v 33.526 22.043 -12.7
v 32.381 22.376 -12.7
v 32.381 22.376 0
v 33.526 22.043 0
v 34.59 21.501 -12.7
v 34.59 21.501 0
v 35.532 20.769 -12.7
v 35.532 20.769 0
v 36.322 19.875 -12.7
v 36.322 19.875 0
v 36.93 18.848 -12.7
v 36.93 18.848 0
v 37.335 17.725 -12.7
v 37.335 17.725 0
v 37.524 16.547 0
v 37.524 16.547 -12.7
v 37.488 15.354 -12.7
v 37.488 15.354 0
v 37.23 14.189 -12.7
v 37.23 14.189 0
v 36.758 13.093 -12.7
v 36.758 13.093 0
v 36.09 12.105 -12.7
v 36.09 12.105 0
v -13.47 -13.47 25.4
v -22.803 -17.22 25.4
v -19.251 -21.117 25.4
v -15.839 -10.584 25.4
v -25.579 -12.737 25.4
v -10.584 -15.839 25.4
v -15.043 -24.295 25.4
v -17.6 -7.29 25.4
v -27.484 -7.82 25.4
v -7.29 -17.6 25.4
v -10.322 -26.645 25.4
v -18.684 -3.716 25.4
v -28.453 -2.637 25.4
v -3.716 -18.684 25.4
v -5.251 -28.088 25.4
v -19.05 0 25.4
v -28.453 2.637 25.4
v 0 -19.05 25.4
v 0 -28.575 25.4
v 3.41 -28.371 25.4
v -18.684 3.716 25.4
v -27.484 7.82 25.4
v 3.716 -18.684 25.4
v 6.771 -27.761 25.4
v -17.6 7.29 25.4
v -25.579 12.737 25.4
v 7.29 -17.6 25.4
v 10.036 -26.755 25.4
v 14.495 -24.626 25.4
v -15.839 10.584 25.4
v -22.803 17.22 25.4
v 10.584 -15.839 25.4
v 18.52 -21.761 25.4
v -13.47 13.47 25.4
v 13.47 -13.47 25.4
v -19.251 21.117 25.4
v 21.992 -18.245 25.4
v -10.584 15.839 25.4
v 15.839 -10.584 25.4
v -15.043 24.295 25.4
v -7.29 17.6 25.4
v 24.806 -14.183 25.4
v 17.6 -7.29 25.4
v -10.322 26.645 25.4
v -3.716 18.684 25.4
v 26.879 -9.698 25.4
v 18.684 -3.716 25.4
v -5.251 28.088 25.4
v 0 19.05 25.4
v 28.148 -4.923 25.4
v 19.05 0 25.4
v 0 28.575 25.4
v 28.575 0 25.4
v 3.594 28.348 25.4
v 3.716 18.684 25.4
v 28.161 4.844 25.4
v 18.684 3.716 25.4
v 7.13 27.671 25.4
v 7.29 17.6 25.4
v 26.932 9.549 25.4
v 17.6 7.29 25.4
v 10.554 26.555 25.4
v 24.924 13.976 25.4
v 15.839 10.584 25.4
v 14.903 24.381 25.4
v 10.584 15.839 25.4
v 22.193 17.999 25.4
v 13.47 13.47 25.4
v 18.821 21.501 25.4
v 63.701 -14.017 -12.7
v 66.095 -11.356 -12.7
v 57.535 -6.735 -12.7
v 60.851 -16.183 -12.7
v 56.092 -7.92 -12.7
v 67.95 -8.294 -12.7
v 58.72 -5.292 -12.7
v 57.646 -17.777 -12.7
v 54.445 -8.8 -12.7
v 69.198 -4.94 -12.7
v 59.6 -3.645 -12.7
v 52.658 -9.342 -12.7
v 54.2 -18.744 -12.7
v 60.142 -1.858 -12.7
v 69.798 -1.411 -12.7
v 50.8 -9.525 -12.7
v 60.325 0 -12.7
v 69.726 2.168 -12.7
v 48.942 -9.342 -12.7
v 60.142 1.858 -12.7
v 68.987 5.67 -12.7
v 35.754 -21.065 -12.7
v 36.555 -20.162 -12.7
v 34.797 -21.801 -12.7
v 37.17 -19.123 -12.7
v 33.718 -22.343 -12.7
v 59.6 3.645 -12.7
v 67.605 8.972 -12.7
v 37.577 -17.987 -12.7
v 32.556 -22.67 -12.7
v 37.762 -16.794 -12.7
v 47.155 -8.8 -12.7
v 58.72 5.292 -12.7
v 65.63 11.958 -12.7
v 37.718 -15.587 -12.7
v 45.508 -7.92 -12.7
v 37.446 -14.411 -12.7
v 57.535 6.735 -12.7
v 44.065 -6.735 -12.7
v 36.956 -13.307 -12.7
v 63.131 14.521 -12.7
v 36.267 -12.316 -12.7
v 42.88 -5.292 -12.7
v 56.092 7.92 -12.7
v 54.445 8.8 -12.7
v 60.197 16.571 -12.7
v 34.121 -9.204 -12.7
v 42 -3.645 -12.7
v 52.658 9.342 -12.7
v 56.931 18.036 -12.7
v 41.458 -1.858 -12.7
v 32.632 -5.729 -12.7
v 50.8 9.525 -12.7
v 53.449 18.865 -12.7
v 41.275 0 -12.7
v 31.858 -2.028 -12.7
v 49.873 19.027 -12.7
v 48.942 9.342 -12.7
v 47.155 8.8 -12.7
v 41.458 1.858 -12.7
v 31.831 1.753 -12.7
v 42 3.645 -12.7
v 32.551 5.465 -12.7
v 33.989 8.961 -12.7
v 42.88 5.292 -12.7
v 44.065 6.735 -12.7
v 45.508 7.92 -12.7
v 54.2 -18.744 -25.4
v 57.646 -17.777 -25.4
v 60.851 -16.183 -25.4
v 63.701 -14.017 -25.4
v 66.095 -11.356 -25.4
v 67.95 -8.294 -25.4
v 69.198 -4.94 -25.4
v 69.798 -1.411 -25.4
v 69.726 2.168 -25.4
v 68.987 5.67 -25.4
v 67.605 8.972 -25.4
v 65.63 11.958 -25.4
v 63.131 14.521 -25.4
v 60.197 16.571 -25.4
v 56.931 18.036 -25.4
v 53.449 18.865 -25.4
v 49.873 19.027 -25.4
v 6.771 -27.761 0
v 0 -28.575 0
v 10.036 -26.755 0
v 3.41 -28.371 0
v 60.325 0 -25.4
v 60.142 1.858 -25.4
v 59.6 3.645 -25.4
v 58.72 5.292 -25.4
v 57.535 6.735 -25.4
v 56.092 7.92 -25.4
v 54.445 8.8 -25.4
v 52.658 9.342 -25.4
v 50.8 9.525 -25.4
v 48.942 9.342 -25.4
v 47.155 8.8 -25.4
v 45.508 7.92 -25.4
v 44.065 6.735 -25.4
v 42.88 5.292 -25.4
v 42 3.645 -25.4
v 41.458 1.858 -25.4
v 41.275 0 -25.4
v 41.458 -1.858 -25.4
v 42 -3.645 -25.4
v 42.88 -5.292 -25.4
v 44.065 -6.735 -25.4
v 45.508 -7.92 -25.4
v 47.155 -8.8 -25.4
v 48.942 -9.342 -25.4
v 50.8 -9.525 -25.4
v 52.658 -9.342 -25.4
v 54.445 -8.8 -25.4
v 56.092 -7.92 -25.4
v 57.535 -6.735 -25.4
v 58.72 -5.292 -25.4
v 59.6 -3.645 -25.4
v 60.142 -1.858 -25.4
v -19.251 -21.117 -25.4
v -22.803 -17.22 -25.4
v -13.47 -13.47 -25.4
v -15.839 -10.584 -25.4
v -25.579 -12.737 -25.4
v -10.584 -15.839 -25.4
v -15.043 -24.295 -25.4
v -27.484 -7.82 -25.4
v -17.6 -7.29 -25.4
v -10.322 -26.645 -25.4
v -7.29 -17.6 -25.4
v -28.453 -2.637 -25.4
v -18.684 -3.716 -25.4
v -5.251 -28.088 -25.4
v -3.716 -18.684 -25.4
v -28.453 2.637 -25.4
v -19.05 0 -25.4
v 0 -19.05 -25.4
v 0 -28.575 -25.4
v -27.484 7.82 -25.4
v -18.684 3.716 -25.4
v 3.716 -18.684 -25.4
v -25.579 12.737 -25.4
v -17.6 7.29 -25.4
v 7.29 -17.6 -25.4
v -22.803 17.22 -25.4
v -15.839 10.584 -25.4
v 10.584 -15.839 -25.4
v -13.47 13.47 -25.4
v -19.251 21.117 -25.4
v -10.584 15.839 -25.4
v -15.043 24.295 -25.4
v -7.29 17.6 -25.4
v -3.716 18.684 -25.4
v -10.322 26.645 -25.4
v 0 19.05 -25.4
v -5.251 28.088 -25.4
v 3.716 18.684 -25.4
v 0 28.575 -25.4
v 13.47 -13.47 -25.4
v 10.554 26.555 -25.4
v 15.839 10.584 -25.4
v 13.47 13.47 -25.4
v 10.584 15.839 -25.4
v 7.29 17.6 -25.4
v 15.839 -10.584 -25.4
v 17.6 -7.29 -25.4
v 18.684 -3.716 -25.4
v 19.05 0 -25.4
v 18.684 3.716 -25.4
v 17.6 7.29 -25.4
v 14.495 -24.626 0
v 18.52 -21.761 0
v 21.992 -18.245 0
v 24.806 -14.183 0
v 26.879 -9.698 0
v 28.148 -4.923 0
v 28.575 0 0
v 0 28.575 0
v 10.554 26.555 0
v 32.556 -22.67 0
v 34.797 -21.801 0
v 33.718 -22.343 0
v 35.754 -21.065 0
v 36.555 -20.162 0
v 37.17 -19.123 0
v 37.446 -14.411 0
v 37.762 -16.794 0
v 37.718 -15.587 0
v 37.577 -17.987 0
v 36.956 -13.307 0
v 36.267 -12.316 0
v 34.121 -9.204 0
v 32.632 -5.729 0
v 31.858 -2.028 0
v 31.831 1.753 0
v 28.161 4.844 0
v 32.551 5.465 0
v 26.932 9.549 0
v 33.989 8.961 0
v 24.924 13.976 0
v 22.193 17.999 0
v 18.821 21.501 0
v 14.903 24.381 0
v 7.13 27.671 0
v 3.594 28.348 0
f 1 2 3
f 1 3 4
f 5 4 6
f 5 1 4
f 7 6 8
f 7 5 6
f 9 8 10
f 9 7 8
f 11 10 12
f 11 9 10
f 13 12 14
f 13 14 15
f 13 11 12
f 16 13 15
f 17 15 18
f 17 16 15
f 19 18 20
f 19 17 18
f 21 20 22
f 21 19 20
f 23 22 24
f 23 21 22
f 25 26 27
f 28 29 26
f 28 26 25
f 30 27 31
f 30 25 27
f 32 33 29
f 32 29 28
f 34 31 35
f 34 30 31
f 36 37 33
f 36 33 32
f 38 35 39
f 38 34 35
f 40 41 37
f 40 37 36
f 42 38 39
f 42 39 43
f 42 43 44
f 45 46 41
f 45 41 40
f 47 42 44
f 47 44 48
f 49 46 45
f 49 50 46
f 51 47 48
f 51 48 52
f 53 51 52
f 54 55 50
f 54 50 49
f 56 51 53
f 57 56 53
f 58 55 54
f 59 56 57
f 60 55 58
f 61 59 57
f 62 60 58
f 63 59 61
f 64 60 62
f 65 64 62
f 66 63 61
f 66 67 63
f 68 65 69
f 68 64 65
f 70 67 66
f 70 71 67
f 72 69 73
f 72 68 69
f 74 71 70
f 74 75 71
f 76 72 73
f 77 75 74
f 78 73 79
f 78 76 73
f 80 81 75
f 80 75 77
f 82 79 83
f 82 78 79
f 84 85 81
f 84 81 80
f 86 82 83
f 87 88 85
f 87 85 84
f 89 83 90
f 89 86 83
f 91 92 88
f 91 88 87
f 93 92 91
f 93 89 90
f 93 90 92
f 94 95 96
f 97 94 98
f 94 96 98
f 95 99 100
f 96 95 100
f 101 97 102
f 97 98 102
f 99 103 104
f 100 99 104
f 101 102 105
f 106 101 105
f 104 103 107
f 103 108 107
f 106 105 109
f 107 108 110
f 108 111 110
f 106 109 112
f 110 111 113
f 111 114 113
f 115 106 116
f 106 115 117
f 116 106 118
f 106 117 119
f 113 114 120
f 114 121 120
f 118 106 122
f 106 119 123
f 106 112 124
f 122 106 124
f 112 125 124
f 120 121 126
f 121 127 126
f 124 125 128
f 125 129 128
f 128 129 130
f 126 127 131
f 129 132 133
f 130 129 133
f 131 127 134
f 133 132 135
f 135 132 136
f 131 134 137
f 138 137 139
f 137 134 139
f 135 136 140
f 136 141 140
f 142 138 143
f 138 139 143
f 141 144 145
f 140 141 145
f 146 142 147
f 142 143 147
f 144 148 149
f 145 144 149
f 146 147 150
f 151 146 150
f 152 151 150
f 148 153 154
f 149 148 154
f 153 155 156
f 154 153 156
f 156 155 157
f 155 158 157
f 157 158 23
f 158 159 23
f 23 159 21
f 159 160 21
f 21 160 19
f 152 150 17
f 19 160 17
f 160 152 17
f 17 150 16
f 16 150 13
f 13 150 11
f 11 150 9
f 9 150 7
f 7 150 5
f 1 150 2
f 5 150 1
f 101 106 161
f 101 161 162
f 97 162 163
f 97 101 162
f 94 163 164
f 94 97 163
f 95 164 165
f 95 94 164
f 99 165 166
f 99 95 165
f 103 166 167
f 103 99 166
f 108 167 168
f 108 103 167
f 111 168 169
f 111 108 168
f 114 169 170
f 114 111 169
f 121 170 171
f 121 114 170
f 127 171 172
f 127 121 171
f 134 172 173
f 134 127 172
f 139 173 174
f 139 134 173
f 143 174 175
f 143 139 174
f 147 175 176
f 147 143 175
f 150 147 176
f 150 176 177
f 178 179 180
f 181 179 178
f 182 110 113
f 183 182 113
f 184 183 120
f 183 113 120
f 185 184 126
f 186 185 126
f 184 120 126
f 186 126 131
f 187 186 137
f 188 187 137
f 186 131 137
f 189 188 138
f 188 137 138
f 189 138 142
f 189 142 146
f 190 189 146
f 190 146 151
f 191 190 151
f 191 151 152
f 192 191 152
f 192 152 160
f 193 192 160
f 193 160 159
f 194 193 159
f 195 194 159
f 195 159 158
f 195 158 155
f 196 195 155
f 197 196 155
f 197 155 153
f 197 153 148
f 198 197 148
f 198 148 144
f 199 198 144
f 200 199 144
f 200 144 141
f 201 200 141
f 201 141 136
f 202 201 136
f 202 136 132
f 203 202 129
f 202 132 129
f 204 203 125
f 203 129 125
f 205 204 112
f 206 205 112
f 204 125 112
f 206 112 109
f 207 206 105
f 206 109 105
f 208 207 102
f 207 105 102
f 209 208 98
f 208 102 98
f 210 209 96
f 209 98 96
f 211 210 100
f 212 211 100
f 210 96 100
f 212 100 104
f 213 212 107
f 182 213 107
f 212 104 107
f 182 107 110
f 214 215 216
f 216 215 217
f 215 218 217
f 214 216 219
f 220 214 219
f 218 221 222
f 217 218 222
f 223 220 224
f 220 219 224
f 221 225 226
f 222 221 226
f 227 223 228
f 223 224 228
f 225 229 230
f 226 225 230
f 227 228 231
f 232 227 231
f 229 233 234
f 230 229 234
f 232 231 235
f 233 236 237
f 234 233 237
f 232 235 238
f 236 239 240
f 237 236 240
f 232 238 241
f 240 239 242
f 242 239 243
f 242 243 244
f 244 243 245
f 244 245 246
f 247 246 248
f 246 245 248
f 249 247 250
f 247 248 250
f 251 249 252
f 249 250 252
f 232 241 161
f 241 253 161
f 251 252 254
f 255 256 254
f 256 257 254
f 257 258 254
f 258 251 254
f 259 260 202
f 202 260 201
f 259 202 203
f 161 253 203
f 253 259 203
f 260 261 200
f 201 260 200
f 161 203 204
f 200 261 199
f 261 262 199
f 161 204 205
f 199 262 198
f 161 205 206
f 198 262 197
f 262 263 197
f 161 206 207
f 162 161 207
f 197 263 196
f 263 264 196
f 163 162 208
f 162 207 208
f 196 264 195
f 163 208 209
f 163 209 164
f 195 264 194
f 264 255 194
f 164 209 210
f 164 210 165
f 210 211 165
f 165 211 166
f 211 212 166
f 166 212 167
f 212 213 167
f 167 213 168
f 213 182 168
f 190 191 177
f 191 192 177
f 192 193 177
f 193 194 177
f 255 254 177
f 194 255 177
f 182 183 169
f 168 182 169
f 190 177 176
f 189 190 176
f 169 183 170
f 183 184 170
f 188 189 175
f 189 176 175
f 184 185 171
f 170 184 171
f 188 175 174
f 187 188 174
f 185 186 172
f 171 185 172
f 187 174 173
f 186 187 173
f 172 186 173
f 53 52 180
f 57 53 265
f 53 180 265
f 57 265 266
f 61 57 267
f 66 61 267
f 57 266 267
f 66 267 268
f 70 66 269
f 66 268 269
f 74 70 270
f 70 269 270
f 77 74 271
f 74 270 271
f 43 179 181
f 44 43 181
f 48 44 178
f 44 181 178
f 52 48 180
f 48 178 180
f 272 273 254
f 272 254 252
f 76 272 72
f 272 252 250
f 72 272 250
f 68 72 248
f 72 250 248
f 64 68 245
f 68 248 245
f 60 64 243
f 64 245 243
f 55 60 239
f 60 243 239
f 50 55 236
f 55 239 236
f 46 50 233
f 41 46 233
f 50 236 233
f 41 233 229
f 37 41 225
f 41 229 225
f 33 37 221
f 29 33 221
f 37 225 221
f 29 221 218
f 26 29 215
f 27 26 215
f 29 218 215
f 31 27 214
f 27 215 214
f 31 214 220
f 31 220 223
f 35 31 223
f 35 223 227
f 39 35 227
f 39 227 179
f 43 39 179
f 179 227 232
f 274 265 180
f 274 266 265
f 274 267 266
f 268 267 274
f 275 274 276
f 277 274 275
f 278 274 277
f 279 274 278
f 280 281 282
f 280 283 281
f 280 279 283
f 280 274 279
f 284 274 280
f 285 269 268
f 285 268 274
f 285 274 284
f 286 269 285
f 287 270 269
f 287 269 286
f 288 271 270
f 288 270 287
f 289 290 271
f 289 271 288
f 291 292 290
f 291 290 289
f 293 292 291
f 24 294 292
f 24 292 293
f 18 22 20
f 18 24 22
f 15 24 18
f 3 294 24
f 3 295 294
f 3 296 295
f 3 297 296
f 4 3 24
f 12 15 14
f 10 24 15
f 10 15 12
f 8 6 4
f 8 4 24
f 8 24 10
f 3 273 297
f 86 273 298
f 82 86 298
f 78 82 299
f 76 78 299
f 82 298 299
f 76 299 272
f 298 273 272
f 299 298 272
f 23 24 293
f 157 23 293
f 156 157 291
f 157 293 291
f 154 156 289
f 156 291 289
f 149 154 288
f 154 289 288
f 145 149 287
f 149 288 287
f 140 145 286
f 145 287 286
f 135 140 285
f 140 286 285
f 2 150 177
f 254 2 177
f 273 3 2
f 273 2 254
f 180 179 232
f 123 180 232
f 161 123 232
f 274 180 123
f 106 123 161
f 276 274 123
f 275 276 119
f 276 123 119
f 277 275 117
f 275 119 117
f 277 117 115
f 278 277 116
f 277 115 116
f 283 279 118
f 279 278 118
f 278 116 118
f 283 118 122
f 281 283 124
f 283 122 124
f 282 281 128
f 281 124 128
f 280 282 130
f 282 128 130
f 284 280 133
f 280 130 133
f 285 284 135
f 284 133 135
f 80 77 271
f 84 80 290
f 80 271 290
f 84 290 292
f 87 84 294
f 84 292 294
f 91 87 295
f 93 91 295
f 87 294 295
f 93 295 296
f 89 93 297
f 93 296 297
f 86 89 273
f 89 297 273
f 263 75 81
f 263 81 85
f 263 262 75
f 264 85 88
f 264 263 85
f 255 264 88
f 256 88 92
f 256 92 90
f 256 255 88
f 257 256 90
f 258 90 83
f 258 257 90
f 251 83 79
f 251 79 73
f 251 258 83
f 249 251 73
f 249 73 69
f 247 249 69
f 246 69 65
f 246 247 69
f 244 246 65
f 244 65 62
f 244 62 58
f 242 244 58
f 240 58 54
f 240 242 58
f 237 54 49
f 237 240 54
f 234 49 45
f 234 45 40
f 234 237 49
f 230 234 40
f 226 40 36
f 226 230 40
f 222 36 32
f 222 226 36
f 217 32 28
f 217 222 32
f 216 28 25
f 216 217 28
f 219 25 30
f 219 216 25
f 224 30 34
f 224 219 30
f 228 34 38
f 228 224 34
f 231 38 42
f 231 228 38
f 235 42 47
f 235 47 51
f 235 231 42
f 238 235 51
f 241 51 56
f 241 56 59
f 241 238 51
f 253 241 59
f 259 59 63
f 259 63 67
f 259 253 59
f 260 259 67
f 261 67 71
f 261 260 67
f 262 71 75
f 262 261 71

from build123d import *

# Parameters (mm, degrees)
F0_R        = 19.05
F0_R_2      = 9.525
F1_DEPTH    = 25.4
F2_DEPTH    = 25.4
F3_DEPTH    = 12.7
F4_T1_DEPTH = 57.2245179891
F4_T3_DEPTH = 67.6926131403


# Not quite as in the source:
# - a fillet or chamfer that OpenCascade refuses, or shapes differently, is made with other operations: its cross-section is extruded or revolved along the edge and cut away or added


with BuildPart() as f1:
    # F0 (on Top) → F1 (new body)
    with BuildSketch(Plane.XY):
        with BuildLine():
            Line((10.5539222721, 26.5545730464), (0, 28.575))
            ThreePointArc((0, 28.575), (-28.575, 0), (0, -28.575))
            Line((0, -28.575), (10.035773719, -26.7546981082))
            ThreePointArc((10.035773719, -26.7546981082), (23.4872610048, -16.2751096921), (28.575, 0))
            ThreePointArc((28.575, 0), (23.644332872, 16.046063319), (10.5539222721, 26.5545730464))
        make_face()
        Circle(F0_R, mode=Mode.SUBTRACT)
        with BuildLine():
            Line((49.8728171001, 19.0274231537), (10.5539222721, 26.5545730464))
            ThreePointArc((10.5539222721, 26.5545730464), (23.644332872, 16.046063319), (28.575, 0))
            ThreePointArc((28.575, 0), (23.4872610048, -16.2751096921), (10.035773719, -26.7546981082))
            Line((10.035773719, -26.7546981082), (54.1998407335, -18.7441613039))
            ThreePointArc((54.1998407335, -18.7441613039), (31.8737838621, -2.1681426844), (49.8728171001, 19.0274231537))
        make_face()
        with BuildLine():
            ThreePointArc((69.85, 0), (63.9384867043, 13.7942983555), (49.8728171001, 19.0274231537))
            ThreePointArc((49.8728171001, 19.0274231537), (31.8737838621, -2.1681426844), (54.1998407335, -18.7441613039))
            ThreePointArc((54.1998407335, -18.7441613039), (65.4230890371, -12.2093311452), (69.85, 0))
        make_face()
        with Locations((50.8, 0)):
            Circle(F0_R_2, mode=Mode.SUBTRACT)
    extrude(amount=-F1_DEPTH)

    # F0 (on Top) → F2 (join)
    with BuildSketch(Plane.XY):
        with BuildLine():
            Line((10.5539222721, 26.5545730464), (0, 28.575))
            ThreePointArc((0, 28.575), (-28.575, 0), (0, -28.575))
            Line((0, -28.575), (10.035773719, -26.7546981082))
            ThreePointArc((10.035773719, -26.7546981082), (23.4872610048, -16.2751096921), (28.575, 0))
            ThreePointArc((28.575, 0), (23.644332872, 16.046063319), (10.5539222721, 26.5545730464))
        make_face()
        Circle(F0_R, mode=Mode.SUBTRACT)
        with BuildLine():
            Line((10.035773719, -26.7546981082), (0, -28.575))
            ThreePointArc((0, -28.575), (5.0997611002, -28.1162419559), (10.035773719, -26.7546981082))
        make_face()
        with BuildLine():
            ThreePointArc((10.5539222721, 26.5545730464), (5.3727879262, 28.0653482947), (0, 28.575))
            Line((0, 28.575), (10.5539222721, 26.5545730464))
        make_face()
    extrude(amount=F2_DEPTH)

    # F0 (on Top) → F3 (cut)
    with BuildSketch(Plane.XY):
        with BuildLine():
            ThreePointArc((69.85, 0), (63.9384867043, 13.7942983555), (49.8728171001, 19.0274231537))
            ThreePointArc((49.8728171001, 19.0274231537), (31.8737838621, -2.1681426844), (54.1998407335, -18.7441613039))
            ThreePointArc((54.1998407335, -18.7441613039), (65.4230890371, -12.2093311452), (69.85, 0))
        make_face()
        with Locations((50.8, 0)):
            Circle(F0_R_2, mode=Mode.SUBTRACT)
    extrude(amount=-F3_DEPTH, mode=Mode.SUBTRACT)

    # F4: fillet of radius 6.35 on 3 edges, made by hand

    # F4_s2 → F4_t1 (cut)
    with BuildSketch(Plane.XY.offset(-12.7)):
        with BuildLine():
            ThreePointArc((32.3806581498, 22.376095667), (37.1591875386, 18.2961908719), (36.0900289579, 12.1045137012))
            ThreePointArc((36.0900289579, 12.1045137012), (42.2494552996, 17.0232395662), (49.8728171001, 19.0274231537))
            Line((49.8728171001, 19.0274231537), (32.3806581498, 22.376095667))
        make_face()
    extrude(amount=F4_T1_DEPTH, mode=Mode.SUBTRACT)

    # F4_s4 → F4_t3 (cut)
    with BuildSketch(Plane.XY.offset(-12.7)):
        with BuildLine():
            ThreePointArc((32.5559475844, -22.6699592292), (37.4002807494, -18.5644828639), (36.2670005049, -12.3164290959))
            ThreePointArc((36.2670005049, -12.3164290959), (44.372267792, -17.9328402285), (54.1998407335, -18.7441613039))
            Line((54.1998407335, -18.7441613039), (32.5559475844, -22.6699592292))
        make_face()
    extrude(amount=F4_T3_DEPTH, mode=Mode.SUBTRACT)


solid = f1.part
